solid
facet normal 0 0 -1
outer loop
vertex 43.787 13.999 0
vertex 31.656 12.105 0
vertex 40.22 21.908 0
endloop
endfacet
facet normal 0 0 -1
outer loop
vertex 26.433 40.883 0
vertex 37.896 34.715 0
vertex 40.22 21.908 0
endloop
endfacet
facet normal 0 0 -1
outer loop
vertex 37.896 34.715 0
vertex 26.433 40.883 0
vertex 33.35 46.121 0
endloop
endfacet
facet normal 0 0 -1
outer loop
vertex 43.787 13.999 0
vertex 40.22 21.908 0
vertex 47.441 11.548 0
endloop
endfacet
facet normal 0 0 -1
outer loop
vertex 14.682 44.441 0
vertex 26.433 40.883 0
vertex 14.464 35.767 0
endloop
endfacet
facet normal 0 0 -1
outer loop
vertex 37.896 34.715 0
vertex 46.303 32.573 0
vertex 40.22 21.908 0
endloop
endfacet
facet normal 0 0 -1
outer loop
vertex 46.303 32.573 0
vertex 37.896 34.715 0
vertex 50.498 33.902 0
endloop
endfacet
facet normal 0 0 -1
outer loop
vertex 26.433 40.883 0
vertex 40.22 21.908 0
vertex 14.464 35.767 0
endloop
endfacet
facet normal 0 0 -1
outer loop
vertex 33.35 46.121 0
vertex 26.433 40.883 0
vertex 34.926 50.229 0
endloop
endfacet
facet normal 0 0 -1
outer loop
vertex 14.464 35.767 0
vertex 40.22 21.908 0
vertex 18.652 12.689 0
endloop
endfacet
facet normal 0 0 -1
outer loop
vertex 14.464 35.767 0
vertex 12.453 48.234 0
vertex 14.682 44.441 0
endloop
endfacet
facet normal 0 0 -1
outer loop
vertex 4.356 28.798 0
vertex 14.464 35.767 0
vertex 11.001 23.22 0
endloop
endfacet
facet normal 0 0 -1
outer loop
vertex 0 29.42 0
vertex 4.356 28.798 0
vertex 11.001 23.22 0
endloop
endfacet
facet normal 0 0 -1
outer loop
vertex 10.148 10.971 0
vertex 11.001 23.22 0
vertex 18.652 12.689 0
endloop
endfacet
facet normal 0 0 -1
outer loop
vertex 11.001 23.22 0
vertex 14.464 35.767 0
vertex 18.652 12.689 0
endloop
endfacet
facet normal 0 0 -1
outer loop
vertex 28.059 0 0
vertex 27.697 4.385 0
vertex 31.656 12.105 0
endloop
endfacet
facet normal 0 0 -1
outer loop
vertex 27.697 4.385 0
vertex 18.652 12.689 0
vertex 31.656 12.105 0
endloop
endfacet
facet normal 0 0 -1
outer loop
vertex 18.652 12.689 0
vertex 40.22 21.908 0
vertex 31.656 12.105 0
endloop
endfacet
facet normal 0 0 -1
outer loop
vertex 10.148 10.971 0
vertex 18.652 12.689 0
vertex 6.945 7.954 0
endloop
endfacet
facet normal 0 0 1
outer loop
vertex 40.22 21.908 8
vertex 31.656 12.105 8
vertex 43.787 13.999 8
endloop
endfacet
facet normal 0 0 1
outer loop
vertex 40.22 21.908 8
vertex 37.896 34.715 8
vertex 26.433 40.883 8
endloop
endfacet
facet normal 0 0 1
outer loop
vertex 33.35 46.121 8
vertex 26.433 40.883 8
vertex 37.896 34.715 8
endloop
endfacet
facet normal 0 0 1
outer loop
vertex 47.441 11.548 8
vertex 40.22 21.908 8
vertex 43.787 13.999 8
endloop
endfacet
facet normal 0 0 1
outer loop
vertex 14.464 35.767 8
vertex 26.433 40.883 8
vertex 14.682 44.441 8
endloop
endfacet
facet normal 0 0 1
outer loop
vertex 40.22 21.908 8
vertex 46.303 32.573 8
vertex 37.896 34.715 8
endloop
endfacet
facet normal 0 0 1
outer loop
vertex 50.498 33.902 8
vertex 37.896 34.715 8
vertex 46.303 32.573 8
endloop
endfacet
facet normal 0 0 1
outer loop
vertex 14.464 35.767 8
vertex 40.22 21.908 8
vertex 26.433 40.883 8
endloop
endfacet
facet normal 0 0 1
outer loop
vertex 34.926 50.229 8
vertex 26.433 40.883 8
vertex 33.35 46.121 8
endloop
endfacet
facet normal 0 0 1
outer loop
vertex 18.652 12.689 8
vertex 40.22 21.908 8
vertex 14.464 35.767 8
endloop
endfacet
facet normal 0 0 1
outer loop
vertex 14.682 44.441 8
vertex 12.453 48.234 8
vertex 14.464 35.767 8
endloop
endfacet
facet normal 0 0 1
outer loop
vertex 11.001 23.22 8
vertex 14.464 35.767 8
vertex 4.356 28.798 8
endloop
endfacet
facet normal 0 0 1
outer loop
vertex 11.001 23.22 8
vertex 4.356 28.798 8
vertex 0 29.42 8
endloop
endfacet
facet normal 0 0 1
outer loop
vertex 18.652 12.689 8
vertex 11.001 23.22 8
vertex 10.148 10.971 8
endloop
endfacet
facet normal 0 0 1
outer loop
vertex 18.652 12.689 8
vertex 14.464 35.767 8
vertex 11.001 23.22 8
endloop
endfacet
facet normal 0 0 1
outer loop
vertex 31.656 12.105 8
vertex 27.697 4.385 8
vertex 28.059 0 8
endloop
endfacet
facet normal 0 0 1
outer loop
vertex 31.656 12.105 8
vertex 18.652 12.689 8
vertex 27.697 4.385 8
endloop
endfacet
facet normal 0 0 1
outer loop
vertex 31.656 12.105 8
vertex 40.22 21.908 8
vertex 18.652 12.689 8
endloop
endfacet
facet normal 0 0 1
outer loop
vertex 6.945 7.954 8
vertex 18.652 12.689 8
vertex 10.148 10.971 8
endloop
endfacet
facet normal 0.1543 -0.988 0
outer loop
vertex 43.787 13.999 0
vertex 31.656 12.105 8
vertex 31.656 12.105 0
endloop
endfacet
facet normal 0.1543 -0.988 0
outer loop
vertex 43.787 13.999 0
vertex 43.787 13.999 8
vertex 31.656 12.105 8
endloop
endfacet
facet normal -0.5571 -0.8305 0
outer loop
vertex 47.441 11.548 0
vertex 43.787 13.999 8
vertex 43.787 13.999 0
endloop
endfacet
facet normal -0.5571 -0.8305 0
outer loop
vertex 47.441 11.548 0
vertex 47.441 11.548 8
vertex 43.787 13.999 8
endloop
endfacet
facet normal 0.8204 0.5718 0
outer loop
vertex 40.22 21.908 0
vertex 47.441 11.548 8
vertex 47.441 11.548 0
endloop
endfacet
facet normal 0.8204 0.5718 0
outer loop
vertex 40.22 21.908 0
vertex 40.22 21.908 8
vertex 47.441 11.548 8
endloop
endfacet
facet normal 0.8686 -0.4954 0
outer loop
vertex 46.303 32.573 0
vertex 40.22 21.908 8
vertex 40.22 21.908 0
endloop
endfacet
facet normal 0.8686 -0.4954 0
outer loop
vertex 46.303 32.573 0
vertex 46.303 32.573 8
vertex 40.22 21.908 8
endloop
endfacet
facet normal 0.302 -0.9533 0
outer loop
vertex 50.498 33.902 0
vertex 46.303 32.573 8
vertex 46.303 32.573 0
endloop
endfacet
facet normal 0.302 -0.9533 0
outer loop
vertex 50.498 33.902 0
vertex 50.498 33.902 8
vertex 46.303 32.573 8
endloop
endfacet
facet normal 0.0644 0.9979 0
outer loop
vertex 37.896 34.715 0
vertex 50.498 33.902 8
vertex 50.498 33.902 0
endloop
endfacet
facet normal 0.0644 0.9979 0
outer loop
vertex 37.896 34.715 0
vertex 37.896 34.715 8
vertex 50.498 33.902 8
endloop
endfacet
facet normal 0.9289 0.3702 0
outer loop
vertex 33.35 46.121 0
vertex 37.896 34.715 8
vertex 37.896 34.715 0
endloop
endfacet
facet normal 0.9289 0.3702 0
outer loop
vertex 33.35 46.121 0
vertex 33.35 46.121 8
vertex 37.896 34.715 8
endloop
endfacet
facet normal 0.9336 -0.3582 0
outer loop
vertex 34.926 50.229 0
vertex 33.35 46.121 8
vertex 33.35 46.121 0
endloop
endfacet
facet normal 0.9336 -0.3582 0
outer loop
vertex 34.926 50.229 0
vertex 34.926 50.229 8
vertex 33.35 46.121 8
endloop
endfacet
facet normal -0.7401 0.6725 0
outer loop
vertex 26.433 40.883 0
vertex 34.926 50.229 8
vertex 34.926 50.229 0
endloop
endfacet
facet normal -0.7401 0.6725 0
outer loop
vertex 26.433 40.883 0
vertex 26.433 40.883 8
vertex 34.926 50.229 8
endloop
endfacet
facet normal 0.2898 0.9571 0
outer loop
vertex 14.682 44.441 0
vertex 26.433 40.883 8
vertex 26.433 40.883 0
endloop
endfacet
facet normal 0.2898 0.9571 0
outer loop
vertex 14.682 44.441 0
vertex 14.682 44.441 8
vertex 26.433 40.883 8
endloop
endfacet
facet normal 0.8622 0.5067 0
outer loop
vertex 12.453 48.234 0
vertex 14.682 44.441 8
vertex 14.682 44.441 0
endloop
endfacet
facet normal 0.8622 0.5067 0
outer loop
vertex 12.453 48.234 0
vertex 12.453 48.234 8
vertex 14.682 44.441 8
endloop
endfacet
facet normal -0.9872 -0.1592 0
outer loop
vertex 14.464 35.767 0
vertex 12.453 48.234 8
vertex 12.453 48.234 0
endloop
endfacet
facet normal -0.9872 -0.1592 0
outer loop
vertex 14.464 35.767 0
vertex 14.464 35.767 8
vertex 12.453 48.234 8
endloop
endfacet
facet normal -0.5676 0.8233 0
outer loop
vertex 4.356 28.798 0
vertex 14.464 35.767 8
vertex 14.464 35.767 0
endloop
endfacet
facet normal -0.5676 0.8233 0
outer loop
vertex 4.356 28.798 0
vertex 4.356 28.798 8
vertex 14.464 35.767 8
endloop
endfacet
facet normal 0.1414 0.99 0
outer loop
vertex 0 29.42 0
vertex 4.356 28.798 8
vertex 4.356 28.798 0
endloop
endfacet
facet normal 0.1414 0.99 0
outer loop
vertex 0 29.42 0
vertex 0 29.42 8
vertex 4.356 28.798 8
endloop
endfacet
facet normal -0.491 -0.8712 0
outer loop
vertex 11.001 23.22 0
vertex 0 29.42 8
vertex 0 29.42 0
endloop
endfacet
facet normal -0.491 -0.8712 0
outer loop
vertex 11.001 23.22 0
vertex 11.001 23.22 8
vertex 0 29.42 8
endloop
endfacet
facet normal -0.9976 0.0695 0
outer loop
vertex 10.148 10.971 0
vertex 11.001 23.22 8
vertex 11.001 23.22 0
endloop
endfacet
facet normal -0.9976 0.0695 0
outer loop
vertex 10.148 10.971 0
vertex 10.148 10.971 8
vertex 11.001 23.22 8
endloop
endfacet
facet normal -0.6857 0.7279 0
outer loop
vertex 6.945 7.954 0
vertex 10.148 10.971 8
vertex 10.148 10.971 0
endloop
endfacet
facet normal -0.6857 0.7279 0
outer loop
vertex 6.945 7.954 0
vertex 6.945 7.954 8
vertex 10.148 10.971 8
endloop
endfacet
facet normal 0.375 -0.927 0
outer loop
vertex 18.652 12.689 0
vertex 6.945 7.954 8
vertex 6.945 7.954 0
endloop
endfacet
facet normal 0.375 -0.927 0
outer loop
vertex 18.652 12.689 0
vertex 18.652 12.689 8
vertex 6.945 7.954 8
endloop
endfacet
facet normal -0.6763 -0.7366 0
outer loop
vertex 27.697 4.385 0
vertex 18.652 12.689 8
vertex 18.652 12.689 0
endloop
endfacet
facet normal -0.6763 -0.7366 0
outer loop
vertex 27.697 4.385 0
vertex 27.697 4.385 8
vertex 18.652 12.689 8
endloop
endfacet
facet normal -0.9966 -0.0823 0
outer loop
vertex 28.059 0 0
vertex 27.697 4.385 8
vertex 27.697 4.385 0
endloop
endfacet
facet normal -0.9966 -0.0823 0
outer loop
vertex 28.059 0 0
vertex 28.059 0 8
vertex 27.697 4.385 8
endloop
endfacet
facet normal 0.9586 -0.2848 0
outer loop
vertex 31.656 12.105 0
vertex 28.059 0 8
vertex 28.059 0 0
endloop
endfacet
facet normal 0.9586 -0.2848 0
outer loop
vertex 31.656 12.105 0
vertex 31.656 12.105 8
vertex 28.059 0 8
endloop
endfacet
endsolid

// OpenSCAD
$fn = 32;

// ----------------------------------------------------------------------
// Fan rotor section: 7 blades, 15 mm hub radius, 11 mm blades
// ----------------------------------------------------------------------

// --- parameters (mm) ---
profile_height = 8;       // extrusion height
profile_points = 21;      // points of the closed outline

profile = [[40.22, 21.908], [46.303, 32.573], [50.498, 33.902], [37.896, 34.715], [33.35, 46.121], [34.926, 50.229], [26.433, 40.883], [14.682, 44.441], [12.453, 48.234], [14.464, 35.767], [4.356, 28.798], [0, 29.42], [11.001, 23.22], [10.148, 10.971], [6.945, 7.954], [18.652, 12.689], [27.697, 4.385], [28.059, 0], [31.656, 12.105], [43.787, 13.999], [47.441, 11.548]];  // single closed polygon, 21 points, counter clockwise

// --- the one profile operation ---
linear_extrude(height = profile_height) polygon(points = profile);
